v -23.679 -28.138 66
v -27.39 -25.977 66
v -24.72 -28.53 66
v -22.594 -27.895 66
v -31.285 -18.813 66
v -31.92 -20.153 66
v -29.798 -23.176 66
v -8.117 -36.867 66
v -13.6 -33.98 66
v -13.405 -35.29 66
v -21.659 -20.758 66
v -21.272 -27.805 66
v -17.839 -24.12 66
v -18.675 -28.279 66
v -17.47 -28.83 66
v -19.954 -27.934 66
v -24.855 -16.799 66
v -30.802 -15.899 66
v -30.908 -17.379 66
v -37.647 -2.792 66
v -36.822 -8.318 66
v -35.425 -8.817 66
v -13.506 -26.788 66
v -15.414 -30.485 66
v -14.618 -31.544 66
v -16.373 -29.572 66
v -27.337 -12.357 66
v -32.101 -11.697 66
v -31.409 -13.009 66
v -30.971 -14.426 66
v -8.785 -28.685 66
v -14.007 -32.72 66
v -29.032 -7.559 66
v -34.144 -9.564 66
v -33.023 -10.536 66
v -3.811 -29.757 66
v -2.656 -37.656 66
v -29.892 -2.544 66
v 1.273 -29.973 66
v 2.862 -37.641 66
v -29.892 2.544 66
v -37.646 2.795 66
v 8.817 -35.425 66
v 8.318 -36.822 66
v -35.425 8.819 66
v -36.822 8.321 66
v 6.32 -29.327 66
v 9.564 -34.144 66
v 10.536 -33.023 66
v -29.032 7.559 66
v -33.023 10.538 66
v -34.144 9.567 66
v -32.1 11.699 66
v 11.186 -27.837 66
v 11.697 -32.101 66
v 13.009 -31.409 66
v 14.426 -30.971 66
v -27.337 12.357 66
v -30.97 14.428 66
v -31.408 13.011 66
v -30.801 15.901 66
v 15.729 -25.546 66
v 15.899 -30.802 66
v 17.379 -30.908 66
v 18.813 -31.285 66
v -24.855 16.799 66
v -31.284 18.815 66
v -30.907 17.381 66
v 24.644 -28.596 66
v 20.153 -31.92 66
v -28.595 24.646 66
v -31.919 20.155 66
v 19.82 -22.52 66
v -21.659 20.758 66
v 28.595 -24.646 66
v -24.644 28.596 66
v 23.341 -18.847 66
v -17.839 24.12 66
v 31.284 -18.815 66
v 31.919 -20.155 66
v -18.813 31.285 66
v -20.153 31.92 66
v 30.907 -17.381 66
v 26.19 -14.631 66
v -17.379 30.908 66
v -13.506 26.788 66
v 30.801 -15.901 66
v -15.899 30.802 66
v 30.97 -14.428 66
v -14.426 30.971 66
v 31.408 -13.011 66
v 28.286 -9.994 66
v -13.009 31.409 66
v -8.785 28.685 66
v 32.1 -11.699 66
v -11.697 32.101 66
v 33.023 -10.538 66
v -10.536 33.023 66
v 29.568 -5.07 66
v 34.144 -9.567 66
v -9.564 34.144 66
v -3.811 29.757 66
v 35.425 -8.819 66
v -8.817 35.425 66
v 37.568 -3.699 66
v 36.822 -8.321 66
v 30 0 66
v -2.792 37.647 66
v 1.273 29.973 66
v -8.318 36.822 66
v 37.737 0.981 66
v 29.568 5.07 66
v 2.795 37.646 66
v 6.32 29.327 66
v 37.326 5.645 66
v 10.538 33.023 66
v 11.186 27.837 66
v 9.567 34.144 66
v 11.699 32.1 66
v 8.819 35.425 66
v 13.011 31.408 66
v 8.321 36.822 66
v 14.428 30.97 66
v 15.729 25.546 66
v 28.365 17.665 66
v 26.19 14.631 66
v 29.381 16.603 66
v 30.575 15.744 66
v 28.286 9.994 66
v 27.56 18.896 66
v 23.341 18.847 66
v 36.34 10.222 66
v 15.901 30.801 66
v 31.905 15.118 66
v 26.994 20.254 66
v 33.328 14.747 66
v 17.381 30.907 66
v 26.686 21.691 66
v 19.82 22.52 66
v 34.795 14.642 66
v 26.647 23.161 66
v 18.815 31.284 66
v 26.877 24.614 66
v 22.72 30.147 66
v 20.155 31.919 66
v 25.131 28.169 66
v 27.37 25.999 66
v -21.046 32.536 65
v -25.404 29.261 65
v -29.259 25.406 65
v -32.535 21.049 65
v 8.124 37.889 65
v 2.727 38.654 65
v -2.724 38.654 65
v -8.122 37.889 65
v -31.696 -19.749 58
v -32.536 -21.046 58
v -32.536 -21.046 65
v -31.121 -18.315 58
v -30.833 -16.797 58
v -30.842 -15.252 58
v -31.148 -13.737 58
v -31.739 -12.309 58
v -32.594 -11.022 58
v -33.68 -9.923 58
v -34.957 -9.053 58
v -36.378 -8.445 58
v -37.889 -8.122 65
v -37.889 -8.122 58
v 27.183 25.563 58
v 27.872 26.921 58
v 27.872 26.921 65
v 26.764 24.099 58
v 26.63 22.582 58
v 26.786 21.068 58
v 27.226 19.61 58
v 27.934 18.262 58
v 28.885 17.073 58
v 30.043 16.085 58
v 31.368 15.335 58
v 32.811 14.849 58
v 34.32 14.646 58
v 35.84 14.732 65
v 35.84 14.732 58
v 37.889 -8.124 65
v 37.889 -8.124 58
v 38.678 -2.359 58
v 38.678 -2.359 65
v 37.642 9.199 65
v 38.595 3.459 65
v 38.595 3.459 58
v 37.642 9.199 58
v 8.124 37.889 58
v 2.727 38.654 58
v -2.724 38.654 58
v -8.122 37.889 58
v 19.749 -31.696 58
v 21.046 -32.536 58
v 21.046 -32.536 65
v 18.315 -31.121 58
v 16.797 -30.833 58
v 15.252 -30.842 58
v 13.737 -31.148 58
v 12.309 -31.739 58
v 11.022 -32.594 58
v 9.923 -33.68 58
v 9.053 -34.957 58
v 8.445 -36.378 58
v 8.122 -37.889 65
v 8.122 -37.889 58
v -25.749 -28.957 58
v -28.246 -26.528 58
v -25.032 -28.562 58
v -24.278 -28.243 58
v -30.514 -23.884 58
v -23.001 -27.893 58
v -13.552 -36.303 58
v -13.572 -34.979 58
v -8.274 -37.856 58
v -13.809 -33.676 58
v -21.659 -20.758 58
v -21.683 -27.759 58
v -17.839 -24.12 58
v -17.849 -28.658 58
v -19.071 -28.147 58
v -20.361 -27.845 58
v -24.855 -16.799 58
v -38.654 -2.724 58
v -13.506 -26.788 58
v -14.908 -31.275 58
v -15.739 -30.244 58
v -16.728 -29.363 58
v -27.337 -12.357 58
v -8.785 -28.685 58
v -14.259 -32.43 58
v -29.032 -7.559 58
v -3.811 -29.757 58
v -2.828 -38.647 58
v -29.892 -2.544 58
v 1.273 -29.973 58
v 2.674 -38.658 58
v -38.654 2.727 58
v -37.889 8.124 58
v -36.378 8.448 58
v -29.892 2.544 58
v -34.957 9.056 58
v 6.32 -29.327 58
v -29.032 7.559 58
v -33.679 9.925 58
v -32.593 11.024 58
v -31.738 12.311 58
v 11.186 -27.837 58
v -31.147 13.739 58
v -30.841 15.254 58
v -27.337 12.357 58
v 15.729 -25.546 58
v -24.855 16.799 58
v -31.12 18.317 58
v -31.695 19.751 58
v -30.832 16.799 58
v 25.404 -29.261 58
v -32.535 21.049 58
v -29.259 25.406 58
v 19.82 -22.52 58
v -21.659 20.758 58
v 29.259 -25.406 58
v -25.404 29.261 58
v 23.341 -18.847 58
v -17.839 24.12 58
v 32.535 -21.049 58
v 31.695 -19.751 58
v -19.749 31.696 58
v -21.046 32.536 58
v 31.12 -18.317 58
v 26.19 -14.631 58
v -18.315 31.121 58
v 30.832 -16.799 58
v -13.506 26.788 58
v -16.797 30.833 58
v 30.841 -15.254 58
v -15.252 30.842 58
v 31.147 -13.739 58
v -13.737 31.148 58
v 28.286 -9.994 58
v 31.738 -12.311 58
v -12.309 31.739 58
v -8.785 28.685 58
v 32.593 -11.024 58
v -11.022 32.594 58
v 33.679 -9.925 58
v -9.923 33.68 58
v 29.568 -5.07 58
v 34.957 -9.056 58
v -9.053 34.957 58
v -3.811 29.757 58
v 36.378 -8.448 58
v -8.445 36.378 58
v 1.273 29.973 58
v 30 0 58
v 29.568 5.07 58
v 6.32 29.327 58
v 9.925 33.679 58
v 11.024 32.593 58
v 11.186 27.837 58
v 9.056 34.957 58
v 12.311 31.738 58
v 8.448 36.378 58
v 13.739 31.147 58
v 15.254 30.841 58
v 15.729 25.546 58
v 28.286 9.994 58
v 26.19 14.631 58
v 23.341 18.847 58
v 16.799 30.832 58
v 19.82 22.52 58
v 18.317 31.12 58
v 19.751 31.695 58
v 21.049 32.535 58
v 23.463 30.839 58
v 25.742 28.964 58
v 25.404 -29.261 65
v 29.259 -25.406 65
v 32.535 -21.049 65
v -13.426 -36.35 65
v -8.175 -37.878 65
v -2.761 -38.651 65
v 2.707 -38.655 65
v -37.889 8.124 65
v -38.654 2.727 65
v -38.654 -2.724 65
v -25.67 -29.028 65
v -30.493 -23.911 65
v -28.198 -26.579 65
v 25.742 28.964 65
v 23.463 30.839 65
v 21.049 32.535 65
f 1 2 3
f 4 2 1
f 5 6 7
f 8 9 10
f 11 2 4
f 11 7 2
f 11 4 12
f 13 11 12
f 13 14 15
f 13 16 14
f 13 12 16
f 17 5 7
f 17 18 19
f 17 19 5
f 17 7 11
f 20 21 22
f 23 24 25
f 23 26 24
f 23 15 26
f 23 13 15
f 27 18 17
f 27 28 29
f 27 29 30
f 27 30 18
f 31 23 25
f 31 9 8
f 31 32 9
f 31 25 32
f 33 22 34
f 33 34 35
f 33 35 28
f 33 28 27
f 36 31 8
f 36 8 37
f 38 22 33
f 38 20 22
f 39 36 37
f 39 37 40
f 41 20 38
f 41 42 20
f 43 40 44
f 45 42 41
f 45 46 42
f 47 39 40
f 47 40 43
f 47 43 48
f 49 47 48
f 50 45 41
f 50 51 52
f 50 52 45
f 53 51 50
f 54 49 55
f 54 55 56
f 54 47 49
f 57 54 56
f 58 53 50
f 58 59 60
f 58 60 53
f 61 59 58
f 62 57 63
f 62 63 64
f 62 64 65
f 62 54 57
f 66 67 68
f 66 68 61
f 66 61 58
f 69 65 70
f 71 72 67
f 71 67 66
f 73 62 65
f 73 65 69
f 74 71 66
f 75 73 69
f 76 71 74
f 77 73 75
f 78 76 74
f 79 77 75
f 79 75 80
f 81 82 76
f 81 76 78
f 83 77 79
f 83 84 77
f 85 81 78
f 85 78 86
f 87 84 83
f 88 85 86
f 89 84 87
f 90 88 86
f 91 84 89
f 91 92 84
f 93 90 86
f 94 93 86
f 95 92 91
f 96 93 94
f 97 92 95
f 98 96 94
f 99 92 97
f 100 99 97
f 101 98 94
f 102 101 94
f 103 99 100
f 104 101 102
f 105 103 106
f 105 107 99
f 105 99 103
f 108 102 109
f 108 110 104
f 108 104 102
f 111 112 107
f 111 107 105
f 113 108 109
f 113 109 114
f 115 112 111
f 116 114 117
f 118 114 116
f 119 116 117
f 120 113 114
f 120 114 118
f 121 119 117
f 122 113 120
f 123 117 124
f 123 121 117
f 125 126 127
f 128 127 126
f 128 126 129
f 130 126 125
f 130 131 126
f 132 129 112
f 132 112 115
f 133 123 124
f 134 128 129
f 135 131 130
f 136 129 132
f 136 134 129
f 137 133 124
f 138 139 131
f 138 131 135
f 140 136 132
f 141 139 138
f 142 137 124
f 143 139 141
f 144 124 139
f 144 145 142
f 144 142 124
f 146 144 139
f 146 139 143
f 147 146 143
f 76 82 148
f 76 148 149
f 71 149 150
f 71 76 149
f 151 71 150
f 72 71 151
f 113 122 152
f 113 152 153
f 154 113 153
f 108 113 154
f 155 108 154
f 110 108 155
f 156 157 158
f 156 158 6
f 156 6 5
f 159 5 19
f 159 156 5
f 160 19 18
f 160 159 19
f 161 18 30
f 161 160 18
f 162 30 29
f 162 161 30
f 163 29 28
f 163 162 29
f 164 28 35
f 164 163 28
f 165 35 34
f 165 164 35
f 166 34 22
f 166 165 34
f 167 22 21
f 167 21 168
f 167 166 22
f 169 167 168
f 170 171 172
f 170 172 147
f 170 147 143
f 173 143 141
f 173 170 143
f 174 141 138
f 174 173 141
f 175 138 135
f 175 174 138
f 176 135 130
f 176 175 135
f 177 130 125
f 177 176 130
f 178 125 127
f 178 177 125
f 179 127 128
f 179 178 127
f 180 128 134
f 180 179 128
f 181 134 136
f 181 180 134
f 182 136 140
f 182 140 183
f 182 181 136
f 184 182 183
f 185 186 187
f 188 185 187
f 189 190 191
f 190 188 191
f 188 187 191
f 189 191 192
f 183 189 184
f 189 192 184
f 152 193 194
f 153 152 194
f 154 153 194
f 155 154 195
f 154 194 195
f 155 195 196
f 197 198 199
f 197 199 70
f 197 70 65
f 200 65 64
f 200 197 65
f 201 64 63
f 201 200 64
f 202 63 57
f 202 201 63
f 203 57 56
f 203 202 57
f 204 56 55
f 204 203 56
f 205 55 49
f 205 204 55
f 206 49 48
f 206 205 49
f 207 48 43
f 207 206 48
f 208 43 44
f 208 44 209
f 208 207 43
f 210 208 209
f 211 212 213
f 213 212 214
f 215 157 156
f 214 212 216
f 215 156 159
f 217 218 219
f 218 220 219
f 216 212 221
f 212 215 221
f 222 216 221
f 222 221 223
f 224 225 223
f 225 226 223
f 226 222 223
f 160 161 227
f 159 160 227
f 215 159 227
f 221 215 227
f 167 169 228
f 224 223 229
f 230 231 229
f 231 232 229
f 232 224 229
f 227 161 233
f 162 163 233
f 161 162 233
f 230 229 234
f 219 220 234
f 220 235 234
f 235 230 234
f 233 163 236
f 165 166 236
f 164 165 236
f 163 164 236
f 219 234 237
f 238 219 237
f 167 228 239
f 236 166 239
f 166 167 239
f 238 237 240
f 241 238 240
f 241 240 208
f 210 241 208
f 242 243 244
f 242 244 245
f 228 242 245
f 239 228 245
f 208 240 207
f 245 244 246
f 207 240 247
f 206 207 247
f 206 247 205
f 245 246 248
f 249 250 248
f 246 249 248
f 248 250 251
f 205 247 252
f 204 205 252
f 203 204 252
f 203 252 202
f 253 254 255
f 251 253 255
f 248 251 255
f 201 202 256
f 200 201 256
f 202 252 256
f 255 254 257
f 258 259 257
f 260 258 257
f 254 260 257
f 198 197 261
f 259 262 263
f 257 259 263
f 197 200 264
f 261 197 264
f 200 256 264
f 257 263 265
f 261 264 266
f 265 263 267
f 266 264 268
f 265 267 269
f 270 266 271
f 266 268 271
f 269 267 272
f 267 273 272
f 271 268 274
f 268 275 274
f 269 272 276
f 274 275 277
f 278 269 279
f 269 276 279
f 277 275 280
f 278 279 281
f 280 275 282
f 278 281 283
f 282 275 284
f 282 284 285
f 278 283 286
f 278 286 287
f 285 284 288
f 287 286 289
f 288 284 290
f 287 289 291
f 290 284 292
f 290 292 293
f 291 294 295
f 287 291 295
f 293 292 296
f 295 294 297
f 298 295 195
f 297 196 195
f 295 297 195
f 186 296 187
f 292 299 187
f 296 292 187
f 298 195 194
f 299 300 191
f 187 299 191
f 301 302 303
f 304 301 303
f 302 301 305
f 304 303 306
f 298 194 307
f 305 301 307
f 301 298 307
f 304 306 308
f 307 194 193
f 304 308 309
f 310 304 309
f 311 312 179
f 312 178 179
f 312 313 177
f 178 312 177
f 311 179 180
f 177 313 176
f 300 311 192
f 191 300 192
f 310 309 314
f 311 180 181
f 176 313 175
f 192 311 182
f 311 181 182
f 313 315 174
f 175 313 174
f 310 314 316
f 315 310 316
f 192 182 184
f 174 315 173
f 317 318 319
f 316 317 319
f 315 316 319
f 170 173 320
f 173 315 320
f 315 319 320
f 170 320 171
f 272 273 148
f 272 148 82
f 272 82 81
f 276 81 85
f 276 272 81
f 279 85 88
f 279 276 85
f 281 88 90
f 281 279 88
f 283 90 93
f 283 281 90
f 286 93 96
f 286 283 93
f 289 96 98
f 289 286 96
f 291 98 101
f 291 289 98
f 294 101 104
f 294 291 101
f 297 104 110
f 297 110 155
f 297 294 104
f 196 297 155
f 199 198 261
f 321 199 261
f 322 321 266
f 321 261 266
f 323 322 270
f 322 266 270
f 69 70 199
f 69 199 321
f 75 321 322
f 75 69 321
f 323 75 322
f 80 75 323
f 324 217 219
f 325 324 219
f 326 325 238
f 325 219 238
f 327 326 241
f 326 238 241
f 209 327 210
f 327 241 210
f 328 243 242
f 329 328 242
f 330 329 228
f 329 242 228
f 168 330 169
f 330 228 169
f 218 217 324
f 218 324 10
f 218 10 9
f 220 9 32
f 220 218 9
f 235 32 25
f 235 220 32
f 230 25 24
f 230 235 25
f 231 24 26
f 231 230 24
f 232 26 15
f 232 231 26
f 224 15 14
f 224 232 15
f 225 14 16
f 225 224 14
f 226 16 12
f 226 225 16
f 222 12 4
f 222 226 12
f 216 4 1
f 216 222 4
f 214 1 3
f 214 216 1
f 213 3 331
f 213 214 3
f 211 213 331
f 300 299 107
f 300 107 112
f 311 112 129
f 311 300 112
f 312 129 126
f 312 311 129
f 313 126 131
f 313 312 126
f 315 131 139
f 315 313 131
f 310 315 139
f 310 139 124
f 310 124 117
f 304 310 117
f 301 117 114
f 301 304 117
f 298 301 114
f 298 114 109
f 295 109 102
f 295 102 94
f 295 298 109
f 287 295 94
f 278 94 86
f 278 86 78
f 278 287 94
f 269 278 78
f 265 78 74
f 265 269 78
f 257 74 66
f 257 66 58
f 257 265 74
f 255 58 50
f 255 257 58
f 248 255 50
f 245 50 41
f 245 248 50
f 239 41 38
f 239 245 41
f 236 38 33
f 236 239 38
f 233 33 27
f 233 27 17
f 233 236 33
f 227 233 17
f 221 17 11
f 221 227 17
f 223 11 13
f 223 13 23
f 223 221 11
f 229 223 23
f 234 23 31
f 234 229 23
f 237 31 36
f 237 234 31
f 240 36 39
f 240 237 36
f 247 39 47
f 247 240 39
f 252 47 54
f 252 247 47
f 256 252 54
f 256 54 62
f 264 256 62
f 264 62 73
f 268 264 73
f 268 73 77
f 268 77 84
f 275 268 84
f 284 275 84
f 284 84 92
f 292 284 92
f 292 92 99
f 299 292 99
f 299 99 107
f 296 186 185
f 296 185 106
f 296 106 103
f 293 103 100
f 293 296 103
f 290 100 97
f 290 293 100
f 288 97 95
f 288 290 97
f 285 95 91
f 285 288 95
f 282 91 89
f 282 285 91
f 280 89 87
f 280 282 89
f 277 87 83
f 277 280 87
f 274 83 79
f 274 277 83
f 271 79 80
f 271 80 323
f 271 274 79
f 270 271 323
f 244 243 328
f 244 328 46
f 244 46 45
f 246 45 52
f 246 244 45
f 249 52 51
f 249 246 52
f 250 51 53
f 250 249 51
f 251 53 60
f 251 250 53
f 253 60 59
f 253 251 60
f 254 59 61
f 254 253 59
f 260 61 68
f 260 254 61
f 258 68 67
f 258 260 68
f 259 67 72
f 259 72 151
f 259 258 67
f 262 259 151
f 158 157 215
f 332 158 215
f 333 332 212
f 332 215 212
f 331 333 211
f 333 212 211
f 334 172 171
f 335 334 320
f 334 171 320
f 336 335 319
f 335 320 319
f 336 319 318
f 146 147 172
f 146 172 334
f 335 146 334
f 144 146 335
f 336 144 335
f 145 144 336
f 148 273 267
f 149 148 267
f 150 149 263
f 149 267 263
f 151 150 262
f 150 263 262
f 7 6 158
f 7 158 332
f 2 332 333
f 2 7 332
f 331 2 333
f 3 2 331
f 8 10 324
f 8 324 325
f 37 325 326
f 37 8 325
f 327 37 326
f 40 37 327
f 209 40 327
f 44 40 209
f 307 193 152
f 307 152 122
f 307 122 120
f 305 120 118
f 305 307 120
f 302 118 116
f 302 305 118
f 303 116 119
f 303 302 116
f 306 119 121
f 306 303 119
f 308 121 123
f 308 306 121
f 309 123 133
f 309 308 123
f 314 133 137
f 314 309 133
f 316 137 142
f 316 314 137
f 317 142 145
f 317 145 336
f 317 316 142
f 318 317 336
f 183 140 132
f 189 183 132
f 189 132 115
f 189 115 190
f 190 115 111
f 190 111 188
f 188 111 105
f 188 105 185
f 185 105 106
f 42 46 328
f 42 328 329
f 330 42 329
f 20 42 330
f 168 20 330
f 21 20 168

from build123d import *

# Parameters (mm, degrees)
CYLINDER692_R               = 8
CYLINDER692_DEPTH           = 25
CYLINDER693_R               = 8
CYLINDER693_DEPTH           = 25
CYLINDER693_PLACEMENT_ANGLE = 225
CYLINDER695_R               = 8
CYLINDER695_DEPTH           = 25
CYLINDER694_R               = 8
CYLINDER694_DEPTH           = 25
CYLINDER694_PLACEMENT_ANGLE = 145
CYLINDER696_R               = 8
CYLINDER696_DEPTH           = 25
CYLINDER697_R               = 8
CYLINDER697_DEPTH           = 25
CYLINDER697_PLACEMENT_ANGLE = 45
CYLINDER690_R               = 8
CYLINDER690_DEPTH           = 25
CYLINDER690_ROLL_ANGLE      = 0.146073
CYLINDER690_PITCH_ANGLE     = 1.079101
CYLINDER690_PLACEMENT_ANGLE = -9.939308
CYLINDER691_R               = 8
CYLINDER691_DEPTH           = 25
CYLINDER691_PLACEMENT_ANGLE = 45
TUBE075_R                   = 38.75
TUBE075_R_2                 = 30
TUBE075_DEPTH               = 8
CHAMFER001_SIZE             = 1


with BuildPart() as v_lec692:
    # Cylinder692 → Cylinder692 (new body)
    with BuildSketch(Plane(origin=(-38.798949, 16.072537, 43), x_dir=(0, -1, 0), z_dir=(0, 0, 1))):
        Circle(CYLINDER692_R)
    extrude(amount=CYLINDER692_DEPTH)


with BuildPart() as v_lec693:
    # Cylinder693 → Cylinder693 (new body)
    with BuildSketch(Plane.XY):
        Circle(CYLINDER693_R)
    extrude(amount=CYLINDER693_DEPTH)


with BuildPart() as v_lec693_1:
    # Cylinder693 placement: moved
    add(v_lec693.part.moved(Location((-16.07, 38.8, 43))).rotate(Axis((-16.07, 38.8, 43), (0, 0, 1)), CYLINDER693_PLACEMENT_ANGLE))


with BuildPart() as v_lec695:
    # Cylinder695 → Cylinder695 (new body)
    with BuildSketch(Plane(origin=(16.072537, 38.798949, 43), x_dir=(-1, 0, 0), z_dir=(0, 0, 1))):
        Circle(CYLINDER695_R)
    extrude(amount=CYLINDER695_DEPTH)


with BuildPart() as v_lec694:
    # Cylinder694 → Cylinder694 (new body)
    with BuildSketch(Plane.XY):
        Circle(CYLINDER694_R)
    extrude(amount=CYLINDER694_DEPTH)


with BuildPart() as v_lec694_1:
    # Cylinder694 placement: moved
    add(v_lec694.part.moved(Location((34.63, 22.64, 43.6))).rotate(Axis((34.63, 22.64, 43.6), (0, 0, 1)), CYLINDER694_PLACEMENT_ANGLE))


with BuildPart() as v_lec696:
    # Cylinder696 → Cylinder696 (new body)
    with BuildSketch(Plane(origin=(38.798949, -16.072537, 43), x_dir=(0, 1, 0), z_dir=(0, 0, 1))):
        Circle(CYLINDER696_R)
    extrude(amount=CYLINDER696_DEPTH)


with BuildPart() as v_lec697:
    # Cylinder697 → Cylinder697 (new body)
    with BuildSketch(Plane.XY):
        Circle(CYLINDER697_R)
    extrude(amount=CYLINDER697_DEPTH)


with BuildPart() as v_lec697_1:
    # Cylinder697 placement: moved
    add(v_lec697.part.moved(Location((16.07, -38.8, 43))).rotate(Axis((16.07, -38.8, 43), (0, 0, 1)), CYLINDER697_PLACEMENT_ANGLE))


with BuildPart() as v_lec690:
    # Cylinder690 → Cylinder690 (new body)
    with BuildSketch(Plane.XY):
        Circle(CYLINDER690_R)
    extrude(amount=CYLINDER690_DEPTH)


with BuildPart() as v_lec690_1:
    # Cylinder690 roll: moved
    add(v_lec690.part.rotate(Axis((0, 0, 0), (1, 0, 0)), CYLINDER690_ROLL_ANGLE))


with BuildPart() as v_lec690_2:
    # Cylinder690 pitch: moved
    add(v_lec690_1.part.rotate(Axis((0, 0, 0), (0, 1, 0)), CYLINDER690_PITCH_ANGLE))


with BuildPart() as v_lec690_3:
    # Cylinder690 placement: moved
    add(v_lec690_2.part.moved(Location((-21.748471, -35.690226, 43.196026))).rotate(Axis((-21.748471, -35.690226, 43.196026), (0, 0, 1)), CYLINDER690_PLACEMENT_ANGLE))


with BuildPart() as compound696:
    # Cylinder691 → Cylinder691 (new body)
    with BuildSketch(Plane.XY):
        Circle(CYLINDER691_R)
    extrude(amount=CYLINDER691_DEPTH)


with BuildPart() as compound696_1:
    # Cylinder691 placement: moved
    add(compound696.part.moved(Location((-38.8, -16.07, 43))).rotate(Axis((-38.8, -16.07, 43), (0, 0, -1)), CYLINDER691_PLACEMENT_ANGLE))

    # Compound696: union Válec692, Válec693, Válec695, Válec694, Válec696, Válec697, Válec690
    add(v_lec692.part)
    add(v_lec693_1.part)
    add(v_lec695.part)
    add(v_lec694_1.part)
    add(v_lec696.part)
    add(v_lec697_1.part)
    add(v_lec690_3.part)


with BuildPart() as compound696_2:
    # Compound696 placement: moved
    add(compound696_1.part.moved(Location((0, 0, 3))))


with BuildPart() as chamfer001:
    # Tube075 → Tube075 (new body)
    with BuildSketch(Plane.XY.offset(58)):
        Circle(TUBE075_R)
        Circle(TUBE075_R_2, mode=Mode.SUBTRACT)
    extrude(amount=TUBE075_DEPTH)

    # Cut317: cut Compound696
    add(compound696_2.part, mode=Mode.SUBTRACT)

    # Chamfer001
    chamfer001_edges = [chamfer001.edges().sort_by_distance(p)[0] for p in [
        (38.534079, -4.085006, 66),
        (38.01562, 7.508338, 66),
        (27.399492, -27.401284, 66),
        (-2.751597, -38.652183, 66),
        (-29.370607, -25.277064, 66),
        (-38.75, 0.001267, 66),
        (-27.399492, 27.401284, 66),
        (0.001267, 38.75, 66),
        (24.6207, 29.922961, 66),
    ]]
    chamfer(chamfer001_edges, length=CHAMFER001_SIZE)


solid = chamfer001.part
